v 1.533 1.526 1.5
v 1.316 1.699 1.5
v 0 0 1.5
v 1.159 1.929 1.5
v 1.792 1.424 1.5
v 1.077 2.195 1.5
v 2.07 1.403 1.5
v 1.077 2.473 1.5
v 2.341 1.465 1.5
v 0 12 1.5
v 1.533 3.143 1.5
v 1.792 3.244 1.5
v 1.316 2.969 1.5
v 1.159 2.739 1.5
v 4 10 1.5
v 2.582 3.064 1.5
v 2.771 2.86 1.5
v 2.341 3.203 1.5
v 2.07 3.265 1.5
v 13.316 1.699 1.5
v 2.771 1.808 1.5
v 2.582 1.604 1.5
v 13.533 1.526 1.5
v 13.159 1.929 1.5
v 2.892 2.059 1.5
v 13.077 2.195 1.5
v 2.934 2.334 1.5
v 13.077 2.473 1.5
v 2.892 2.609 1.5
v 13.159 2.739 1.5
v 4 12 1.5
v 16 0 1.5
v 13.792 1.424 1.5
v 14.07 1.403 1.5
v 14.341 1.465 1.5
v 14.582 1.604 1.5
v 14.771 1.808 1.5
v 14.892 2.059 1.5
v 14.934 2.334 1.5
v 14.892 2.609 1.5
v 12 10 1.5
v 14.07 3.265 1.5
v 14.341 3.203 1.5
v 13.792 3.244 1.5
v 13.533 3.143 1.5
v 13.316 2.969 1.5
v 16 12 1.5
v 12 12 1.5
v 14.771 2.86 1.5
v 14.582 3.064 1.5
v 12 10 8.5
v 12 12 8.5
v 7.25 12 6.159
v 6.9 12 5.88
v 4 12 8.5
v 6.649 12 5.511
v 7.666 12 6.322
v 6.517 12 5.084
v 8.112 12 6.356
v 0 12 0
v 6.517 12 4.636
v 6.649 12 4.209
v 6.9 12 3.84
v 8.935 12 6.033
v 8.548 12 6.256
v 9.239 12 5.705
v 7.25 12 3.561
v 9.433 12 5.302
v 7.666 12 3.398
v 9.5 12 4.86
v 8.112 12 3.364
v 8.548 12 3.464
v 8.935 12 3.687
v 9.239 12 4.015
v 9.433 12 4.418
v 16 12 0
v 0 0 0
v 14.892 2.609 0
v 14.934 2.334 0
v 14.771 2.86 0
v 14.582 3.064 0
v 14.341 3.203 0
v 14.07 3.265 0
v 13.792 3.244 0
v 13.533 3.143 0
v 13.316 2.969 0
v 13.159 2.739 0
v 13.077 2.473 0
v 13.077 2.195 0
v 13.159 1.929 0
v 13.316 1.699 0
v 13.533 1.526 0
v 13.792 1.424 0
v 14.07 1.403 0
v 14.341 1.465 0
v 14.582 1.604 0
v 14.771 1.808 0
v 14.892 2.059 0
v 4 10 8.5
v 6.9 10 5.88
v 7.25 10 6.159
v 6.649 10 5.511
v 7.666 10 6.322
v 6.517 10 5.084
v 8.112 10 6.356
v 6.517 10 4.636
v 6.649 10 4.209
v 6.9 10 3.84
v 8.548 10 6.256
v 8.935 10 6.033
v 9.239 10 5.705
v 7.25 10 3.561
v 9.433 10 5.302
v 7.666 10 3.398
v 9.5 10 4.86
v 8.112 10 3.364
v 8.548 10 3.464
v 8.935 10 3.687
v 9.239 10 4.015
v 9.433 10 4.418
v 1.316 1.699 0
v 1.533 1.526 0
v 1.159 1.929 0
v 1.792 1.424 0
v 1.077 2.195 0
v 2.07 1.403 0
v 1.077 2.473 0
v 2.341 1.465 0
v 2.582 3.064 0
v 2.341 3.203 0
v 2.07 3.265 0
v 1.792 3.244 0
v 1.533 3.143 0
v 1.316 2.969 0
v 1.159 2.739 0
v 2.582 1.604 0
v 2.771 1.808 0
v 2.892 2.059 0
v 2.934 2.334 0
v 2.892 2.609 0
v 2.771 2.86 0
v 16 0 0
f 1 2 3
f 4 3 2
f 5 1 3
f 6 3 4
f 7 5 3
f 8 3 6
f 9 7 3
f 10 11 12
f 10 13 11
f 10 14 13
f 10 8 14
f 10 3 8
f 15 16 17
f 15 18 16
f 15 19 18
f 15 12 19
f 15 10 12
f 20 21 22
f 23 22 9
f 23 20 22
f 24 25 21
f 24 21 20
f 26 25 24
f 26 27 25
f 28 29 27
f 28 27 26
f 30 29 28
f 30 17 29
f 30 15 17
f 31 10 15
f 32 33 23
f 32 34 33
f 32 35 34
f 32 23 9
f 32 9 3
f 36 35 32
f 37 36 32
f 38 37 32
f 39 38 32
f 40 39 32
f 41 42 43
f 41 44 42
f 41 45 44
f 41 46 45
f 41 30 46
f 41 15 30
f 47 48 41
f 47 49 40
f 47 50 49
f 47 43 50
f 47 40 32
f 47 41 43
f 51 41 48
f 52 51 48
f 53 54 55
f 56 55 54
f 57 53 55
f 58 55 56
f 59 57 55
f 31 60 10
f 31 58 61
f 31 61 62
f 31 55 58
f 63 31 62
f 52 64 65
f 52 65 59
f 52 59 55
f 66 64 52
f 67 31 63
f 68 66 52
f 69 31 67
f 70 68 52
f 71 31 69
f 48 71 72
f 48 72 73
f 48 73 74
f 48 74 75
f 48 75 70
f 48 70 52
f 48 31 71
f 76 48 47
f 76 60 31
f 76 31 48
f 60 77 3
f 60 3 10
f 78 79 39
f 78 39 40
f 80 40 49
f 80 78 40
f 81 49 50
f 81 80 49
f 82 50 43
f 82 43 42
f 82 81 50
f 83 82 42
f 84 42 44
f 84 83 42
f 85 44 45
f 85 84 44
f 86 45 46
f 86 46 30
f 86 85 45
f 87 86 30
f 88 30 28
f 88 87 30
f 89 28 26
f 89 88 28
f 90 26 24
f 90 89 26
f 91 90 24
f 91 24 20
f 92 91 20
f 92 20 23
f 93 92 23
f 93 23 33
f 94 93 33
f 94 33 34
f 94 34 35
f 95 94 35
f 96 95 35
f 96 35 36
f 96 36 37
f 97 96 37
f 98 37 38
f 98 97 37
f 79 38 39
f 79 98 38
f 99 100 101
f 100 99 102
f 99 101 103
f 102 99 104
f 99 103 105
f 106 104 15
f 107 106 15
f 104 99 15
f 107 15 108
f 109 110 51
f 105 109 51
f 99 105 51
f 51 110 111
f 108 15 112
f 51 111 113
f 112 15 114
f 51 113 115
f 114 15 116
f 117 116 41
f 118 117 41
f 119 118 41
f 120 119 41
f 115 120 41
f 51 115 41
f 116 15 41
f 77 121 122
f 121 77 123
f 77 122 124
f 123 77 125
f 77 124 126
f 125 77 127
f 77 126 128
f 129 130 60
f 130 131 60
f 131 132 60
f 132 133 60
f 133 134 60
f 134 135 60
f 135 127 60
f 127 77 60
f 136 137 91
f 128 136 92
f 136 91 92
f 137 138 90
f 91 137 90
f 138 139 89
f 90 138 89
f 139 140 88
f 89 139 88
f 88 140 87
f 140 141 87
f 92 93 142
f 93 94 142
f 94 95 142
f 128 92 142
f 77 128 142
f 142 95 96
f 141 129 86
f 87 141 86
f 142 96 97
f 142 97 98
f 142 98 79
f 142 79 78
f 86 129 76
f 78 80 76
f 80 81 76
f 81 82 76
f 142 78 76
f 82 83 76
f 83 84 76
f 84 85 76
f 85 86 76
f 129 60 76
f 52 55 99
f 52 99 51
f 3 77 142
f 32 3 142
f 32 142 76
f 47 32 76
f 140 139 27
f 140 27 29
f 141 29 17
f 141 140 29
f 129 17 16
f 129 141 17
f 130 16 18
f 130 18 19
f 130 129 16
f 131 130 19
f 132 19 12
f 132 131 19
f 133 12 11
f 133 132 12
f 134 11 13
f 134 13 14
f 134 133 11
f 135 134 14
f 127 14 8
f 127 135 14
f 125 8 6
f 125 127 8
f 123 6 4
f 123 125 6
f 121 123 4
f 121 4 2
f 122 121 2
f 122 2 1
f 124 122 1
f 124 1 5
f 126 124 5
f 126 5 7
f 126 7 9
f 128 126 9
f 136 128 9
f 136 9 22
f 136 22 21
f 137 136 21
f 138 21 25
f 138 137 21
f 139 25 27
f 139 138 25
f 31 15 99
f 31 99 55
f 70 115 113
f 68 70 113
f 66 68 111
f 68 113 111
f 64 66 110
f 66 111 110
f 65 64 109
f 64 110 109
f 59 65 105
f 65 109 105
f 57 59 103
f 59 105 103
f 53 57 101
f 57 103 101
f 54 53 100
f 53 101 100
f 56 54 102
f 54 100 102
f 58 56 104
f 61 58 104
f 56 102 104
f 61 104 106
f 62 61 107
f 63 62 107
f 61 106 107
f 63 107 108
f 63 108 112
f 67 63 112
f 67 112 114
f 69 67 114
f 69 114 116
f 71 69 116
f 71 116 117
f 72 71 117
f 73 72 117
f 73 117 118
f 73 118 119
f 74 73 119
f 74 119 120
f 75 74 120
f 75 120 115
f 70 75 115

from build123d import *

# Parameters (mm, degrees)
SKETCH_2_W          = 16
SKETCH_2_H          = 12
SKETCH_2_R          = 0.933622945
EXTRUDE_1_DEPTH     = 1.5
SKETCH_3_W          = 8
SKETCH_3_H          = 2
EXTRUDE_2_DEPTH     = 7
SKETCH_4_R          = 1.5
CUT_EXTRUDE_1_DEPTH = 3


with BuildPart() as part:
    # 草图2 → 凸台-拉伸1 (new body)
    with BuildSketch(Plane.XY):
        with Locations((8, 6)):
            Rectangle(SKETCH_2_W, SKETCH_2_H)
        with Locations((2, 2.334057363)):
            Circle(SKETCH_2_R, mode=Mode.SUBTRACT)
        with Locations((14, 2.334057363)):
            Circle(SKETCH_2_R, mode=Mode.SUBTRACT)
    extrude(amount=EXTRUDE_1_DEPTH)

    # 草图3 → 凸台-拉伸2 (add)
    with BuildSketch(Plane.XY.offset(1.5)):
        with Locations((8, 11)):
            Rectangle(SKETCH_3_W, SKETCH_3_H)
    extrude(amount=EXTRUDE_2_DEPTH)

    # 草图4 → 切除-拉伸1 (cut)
    with BuildSketch(Plane.XZ.offset(-10)):
        with Locations((8, 4.86)):
            Circle(SKETCH_4_R)
    extrude(amount=-CUT_EXTRUDE_1_DEPTH, mode=Mode.SUBTRACT)


solid = part.part
